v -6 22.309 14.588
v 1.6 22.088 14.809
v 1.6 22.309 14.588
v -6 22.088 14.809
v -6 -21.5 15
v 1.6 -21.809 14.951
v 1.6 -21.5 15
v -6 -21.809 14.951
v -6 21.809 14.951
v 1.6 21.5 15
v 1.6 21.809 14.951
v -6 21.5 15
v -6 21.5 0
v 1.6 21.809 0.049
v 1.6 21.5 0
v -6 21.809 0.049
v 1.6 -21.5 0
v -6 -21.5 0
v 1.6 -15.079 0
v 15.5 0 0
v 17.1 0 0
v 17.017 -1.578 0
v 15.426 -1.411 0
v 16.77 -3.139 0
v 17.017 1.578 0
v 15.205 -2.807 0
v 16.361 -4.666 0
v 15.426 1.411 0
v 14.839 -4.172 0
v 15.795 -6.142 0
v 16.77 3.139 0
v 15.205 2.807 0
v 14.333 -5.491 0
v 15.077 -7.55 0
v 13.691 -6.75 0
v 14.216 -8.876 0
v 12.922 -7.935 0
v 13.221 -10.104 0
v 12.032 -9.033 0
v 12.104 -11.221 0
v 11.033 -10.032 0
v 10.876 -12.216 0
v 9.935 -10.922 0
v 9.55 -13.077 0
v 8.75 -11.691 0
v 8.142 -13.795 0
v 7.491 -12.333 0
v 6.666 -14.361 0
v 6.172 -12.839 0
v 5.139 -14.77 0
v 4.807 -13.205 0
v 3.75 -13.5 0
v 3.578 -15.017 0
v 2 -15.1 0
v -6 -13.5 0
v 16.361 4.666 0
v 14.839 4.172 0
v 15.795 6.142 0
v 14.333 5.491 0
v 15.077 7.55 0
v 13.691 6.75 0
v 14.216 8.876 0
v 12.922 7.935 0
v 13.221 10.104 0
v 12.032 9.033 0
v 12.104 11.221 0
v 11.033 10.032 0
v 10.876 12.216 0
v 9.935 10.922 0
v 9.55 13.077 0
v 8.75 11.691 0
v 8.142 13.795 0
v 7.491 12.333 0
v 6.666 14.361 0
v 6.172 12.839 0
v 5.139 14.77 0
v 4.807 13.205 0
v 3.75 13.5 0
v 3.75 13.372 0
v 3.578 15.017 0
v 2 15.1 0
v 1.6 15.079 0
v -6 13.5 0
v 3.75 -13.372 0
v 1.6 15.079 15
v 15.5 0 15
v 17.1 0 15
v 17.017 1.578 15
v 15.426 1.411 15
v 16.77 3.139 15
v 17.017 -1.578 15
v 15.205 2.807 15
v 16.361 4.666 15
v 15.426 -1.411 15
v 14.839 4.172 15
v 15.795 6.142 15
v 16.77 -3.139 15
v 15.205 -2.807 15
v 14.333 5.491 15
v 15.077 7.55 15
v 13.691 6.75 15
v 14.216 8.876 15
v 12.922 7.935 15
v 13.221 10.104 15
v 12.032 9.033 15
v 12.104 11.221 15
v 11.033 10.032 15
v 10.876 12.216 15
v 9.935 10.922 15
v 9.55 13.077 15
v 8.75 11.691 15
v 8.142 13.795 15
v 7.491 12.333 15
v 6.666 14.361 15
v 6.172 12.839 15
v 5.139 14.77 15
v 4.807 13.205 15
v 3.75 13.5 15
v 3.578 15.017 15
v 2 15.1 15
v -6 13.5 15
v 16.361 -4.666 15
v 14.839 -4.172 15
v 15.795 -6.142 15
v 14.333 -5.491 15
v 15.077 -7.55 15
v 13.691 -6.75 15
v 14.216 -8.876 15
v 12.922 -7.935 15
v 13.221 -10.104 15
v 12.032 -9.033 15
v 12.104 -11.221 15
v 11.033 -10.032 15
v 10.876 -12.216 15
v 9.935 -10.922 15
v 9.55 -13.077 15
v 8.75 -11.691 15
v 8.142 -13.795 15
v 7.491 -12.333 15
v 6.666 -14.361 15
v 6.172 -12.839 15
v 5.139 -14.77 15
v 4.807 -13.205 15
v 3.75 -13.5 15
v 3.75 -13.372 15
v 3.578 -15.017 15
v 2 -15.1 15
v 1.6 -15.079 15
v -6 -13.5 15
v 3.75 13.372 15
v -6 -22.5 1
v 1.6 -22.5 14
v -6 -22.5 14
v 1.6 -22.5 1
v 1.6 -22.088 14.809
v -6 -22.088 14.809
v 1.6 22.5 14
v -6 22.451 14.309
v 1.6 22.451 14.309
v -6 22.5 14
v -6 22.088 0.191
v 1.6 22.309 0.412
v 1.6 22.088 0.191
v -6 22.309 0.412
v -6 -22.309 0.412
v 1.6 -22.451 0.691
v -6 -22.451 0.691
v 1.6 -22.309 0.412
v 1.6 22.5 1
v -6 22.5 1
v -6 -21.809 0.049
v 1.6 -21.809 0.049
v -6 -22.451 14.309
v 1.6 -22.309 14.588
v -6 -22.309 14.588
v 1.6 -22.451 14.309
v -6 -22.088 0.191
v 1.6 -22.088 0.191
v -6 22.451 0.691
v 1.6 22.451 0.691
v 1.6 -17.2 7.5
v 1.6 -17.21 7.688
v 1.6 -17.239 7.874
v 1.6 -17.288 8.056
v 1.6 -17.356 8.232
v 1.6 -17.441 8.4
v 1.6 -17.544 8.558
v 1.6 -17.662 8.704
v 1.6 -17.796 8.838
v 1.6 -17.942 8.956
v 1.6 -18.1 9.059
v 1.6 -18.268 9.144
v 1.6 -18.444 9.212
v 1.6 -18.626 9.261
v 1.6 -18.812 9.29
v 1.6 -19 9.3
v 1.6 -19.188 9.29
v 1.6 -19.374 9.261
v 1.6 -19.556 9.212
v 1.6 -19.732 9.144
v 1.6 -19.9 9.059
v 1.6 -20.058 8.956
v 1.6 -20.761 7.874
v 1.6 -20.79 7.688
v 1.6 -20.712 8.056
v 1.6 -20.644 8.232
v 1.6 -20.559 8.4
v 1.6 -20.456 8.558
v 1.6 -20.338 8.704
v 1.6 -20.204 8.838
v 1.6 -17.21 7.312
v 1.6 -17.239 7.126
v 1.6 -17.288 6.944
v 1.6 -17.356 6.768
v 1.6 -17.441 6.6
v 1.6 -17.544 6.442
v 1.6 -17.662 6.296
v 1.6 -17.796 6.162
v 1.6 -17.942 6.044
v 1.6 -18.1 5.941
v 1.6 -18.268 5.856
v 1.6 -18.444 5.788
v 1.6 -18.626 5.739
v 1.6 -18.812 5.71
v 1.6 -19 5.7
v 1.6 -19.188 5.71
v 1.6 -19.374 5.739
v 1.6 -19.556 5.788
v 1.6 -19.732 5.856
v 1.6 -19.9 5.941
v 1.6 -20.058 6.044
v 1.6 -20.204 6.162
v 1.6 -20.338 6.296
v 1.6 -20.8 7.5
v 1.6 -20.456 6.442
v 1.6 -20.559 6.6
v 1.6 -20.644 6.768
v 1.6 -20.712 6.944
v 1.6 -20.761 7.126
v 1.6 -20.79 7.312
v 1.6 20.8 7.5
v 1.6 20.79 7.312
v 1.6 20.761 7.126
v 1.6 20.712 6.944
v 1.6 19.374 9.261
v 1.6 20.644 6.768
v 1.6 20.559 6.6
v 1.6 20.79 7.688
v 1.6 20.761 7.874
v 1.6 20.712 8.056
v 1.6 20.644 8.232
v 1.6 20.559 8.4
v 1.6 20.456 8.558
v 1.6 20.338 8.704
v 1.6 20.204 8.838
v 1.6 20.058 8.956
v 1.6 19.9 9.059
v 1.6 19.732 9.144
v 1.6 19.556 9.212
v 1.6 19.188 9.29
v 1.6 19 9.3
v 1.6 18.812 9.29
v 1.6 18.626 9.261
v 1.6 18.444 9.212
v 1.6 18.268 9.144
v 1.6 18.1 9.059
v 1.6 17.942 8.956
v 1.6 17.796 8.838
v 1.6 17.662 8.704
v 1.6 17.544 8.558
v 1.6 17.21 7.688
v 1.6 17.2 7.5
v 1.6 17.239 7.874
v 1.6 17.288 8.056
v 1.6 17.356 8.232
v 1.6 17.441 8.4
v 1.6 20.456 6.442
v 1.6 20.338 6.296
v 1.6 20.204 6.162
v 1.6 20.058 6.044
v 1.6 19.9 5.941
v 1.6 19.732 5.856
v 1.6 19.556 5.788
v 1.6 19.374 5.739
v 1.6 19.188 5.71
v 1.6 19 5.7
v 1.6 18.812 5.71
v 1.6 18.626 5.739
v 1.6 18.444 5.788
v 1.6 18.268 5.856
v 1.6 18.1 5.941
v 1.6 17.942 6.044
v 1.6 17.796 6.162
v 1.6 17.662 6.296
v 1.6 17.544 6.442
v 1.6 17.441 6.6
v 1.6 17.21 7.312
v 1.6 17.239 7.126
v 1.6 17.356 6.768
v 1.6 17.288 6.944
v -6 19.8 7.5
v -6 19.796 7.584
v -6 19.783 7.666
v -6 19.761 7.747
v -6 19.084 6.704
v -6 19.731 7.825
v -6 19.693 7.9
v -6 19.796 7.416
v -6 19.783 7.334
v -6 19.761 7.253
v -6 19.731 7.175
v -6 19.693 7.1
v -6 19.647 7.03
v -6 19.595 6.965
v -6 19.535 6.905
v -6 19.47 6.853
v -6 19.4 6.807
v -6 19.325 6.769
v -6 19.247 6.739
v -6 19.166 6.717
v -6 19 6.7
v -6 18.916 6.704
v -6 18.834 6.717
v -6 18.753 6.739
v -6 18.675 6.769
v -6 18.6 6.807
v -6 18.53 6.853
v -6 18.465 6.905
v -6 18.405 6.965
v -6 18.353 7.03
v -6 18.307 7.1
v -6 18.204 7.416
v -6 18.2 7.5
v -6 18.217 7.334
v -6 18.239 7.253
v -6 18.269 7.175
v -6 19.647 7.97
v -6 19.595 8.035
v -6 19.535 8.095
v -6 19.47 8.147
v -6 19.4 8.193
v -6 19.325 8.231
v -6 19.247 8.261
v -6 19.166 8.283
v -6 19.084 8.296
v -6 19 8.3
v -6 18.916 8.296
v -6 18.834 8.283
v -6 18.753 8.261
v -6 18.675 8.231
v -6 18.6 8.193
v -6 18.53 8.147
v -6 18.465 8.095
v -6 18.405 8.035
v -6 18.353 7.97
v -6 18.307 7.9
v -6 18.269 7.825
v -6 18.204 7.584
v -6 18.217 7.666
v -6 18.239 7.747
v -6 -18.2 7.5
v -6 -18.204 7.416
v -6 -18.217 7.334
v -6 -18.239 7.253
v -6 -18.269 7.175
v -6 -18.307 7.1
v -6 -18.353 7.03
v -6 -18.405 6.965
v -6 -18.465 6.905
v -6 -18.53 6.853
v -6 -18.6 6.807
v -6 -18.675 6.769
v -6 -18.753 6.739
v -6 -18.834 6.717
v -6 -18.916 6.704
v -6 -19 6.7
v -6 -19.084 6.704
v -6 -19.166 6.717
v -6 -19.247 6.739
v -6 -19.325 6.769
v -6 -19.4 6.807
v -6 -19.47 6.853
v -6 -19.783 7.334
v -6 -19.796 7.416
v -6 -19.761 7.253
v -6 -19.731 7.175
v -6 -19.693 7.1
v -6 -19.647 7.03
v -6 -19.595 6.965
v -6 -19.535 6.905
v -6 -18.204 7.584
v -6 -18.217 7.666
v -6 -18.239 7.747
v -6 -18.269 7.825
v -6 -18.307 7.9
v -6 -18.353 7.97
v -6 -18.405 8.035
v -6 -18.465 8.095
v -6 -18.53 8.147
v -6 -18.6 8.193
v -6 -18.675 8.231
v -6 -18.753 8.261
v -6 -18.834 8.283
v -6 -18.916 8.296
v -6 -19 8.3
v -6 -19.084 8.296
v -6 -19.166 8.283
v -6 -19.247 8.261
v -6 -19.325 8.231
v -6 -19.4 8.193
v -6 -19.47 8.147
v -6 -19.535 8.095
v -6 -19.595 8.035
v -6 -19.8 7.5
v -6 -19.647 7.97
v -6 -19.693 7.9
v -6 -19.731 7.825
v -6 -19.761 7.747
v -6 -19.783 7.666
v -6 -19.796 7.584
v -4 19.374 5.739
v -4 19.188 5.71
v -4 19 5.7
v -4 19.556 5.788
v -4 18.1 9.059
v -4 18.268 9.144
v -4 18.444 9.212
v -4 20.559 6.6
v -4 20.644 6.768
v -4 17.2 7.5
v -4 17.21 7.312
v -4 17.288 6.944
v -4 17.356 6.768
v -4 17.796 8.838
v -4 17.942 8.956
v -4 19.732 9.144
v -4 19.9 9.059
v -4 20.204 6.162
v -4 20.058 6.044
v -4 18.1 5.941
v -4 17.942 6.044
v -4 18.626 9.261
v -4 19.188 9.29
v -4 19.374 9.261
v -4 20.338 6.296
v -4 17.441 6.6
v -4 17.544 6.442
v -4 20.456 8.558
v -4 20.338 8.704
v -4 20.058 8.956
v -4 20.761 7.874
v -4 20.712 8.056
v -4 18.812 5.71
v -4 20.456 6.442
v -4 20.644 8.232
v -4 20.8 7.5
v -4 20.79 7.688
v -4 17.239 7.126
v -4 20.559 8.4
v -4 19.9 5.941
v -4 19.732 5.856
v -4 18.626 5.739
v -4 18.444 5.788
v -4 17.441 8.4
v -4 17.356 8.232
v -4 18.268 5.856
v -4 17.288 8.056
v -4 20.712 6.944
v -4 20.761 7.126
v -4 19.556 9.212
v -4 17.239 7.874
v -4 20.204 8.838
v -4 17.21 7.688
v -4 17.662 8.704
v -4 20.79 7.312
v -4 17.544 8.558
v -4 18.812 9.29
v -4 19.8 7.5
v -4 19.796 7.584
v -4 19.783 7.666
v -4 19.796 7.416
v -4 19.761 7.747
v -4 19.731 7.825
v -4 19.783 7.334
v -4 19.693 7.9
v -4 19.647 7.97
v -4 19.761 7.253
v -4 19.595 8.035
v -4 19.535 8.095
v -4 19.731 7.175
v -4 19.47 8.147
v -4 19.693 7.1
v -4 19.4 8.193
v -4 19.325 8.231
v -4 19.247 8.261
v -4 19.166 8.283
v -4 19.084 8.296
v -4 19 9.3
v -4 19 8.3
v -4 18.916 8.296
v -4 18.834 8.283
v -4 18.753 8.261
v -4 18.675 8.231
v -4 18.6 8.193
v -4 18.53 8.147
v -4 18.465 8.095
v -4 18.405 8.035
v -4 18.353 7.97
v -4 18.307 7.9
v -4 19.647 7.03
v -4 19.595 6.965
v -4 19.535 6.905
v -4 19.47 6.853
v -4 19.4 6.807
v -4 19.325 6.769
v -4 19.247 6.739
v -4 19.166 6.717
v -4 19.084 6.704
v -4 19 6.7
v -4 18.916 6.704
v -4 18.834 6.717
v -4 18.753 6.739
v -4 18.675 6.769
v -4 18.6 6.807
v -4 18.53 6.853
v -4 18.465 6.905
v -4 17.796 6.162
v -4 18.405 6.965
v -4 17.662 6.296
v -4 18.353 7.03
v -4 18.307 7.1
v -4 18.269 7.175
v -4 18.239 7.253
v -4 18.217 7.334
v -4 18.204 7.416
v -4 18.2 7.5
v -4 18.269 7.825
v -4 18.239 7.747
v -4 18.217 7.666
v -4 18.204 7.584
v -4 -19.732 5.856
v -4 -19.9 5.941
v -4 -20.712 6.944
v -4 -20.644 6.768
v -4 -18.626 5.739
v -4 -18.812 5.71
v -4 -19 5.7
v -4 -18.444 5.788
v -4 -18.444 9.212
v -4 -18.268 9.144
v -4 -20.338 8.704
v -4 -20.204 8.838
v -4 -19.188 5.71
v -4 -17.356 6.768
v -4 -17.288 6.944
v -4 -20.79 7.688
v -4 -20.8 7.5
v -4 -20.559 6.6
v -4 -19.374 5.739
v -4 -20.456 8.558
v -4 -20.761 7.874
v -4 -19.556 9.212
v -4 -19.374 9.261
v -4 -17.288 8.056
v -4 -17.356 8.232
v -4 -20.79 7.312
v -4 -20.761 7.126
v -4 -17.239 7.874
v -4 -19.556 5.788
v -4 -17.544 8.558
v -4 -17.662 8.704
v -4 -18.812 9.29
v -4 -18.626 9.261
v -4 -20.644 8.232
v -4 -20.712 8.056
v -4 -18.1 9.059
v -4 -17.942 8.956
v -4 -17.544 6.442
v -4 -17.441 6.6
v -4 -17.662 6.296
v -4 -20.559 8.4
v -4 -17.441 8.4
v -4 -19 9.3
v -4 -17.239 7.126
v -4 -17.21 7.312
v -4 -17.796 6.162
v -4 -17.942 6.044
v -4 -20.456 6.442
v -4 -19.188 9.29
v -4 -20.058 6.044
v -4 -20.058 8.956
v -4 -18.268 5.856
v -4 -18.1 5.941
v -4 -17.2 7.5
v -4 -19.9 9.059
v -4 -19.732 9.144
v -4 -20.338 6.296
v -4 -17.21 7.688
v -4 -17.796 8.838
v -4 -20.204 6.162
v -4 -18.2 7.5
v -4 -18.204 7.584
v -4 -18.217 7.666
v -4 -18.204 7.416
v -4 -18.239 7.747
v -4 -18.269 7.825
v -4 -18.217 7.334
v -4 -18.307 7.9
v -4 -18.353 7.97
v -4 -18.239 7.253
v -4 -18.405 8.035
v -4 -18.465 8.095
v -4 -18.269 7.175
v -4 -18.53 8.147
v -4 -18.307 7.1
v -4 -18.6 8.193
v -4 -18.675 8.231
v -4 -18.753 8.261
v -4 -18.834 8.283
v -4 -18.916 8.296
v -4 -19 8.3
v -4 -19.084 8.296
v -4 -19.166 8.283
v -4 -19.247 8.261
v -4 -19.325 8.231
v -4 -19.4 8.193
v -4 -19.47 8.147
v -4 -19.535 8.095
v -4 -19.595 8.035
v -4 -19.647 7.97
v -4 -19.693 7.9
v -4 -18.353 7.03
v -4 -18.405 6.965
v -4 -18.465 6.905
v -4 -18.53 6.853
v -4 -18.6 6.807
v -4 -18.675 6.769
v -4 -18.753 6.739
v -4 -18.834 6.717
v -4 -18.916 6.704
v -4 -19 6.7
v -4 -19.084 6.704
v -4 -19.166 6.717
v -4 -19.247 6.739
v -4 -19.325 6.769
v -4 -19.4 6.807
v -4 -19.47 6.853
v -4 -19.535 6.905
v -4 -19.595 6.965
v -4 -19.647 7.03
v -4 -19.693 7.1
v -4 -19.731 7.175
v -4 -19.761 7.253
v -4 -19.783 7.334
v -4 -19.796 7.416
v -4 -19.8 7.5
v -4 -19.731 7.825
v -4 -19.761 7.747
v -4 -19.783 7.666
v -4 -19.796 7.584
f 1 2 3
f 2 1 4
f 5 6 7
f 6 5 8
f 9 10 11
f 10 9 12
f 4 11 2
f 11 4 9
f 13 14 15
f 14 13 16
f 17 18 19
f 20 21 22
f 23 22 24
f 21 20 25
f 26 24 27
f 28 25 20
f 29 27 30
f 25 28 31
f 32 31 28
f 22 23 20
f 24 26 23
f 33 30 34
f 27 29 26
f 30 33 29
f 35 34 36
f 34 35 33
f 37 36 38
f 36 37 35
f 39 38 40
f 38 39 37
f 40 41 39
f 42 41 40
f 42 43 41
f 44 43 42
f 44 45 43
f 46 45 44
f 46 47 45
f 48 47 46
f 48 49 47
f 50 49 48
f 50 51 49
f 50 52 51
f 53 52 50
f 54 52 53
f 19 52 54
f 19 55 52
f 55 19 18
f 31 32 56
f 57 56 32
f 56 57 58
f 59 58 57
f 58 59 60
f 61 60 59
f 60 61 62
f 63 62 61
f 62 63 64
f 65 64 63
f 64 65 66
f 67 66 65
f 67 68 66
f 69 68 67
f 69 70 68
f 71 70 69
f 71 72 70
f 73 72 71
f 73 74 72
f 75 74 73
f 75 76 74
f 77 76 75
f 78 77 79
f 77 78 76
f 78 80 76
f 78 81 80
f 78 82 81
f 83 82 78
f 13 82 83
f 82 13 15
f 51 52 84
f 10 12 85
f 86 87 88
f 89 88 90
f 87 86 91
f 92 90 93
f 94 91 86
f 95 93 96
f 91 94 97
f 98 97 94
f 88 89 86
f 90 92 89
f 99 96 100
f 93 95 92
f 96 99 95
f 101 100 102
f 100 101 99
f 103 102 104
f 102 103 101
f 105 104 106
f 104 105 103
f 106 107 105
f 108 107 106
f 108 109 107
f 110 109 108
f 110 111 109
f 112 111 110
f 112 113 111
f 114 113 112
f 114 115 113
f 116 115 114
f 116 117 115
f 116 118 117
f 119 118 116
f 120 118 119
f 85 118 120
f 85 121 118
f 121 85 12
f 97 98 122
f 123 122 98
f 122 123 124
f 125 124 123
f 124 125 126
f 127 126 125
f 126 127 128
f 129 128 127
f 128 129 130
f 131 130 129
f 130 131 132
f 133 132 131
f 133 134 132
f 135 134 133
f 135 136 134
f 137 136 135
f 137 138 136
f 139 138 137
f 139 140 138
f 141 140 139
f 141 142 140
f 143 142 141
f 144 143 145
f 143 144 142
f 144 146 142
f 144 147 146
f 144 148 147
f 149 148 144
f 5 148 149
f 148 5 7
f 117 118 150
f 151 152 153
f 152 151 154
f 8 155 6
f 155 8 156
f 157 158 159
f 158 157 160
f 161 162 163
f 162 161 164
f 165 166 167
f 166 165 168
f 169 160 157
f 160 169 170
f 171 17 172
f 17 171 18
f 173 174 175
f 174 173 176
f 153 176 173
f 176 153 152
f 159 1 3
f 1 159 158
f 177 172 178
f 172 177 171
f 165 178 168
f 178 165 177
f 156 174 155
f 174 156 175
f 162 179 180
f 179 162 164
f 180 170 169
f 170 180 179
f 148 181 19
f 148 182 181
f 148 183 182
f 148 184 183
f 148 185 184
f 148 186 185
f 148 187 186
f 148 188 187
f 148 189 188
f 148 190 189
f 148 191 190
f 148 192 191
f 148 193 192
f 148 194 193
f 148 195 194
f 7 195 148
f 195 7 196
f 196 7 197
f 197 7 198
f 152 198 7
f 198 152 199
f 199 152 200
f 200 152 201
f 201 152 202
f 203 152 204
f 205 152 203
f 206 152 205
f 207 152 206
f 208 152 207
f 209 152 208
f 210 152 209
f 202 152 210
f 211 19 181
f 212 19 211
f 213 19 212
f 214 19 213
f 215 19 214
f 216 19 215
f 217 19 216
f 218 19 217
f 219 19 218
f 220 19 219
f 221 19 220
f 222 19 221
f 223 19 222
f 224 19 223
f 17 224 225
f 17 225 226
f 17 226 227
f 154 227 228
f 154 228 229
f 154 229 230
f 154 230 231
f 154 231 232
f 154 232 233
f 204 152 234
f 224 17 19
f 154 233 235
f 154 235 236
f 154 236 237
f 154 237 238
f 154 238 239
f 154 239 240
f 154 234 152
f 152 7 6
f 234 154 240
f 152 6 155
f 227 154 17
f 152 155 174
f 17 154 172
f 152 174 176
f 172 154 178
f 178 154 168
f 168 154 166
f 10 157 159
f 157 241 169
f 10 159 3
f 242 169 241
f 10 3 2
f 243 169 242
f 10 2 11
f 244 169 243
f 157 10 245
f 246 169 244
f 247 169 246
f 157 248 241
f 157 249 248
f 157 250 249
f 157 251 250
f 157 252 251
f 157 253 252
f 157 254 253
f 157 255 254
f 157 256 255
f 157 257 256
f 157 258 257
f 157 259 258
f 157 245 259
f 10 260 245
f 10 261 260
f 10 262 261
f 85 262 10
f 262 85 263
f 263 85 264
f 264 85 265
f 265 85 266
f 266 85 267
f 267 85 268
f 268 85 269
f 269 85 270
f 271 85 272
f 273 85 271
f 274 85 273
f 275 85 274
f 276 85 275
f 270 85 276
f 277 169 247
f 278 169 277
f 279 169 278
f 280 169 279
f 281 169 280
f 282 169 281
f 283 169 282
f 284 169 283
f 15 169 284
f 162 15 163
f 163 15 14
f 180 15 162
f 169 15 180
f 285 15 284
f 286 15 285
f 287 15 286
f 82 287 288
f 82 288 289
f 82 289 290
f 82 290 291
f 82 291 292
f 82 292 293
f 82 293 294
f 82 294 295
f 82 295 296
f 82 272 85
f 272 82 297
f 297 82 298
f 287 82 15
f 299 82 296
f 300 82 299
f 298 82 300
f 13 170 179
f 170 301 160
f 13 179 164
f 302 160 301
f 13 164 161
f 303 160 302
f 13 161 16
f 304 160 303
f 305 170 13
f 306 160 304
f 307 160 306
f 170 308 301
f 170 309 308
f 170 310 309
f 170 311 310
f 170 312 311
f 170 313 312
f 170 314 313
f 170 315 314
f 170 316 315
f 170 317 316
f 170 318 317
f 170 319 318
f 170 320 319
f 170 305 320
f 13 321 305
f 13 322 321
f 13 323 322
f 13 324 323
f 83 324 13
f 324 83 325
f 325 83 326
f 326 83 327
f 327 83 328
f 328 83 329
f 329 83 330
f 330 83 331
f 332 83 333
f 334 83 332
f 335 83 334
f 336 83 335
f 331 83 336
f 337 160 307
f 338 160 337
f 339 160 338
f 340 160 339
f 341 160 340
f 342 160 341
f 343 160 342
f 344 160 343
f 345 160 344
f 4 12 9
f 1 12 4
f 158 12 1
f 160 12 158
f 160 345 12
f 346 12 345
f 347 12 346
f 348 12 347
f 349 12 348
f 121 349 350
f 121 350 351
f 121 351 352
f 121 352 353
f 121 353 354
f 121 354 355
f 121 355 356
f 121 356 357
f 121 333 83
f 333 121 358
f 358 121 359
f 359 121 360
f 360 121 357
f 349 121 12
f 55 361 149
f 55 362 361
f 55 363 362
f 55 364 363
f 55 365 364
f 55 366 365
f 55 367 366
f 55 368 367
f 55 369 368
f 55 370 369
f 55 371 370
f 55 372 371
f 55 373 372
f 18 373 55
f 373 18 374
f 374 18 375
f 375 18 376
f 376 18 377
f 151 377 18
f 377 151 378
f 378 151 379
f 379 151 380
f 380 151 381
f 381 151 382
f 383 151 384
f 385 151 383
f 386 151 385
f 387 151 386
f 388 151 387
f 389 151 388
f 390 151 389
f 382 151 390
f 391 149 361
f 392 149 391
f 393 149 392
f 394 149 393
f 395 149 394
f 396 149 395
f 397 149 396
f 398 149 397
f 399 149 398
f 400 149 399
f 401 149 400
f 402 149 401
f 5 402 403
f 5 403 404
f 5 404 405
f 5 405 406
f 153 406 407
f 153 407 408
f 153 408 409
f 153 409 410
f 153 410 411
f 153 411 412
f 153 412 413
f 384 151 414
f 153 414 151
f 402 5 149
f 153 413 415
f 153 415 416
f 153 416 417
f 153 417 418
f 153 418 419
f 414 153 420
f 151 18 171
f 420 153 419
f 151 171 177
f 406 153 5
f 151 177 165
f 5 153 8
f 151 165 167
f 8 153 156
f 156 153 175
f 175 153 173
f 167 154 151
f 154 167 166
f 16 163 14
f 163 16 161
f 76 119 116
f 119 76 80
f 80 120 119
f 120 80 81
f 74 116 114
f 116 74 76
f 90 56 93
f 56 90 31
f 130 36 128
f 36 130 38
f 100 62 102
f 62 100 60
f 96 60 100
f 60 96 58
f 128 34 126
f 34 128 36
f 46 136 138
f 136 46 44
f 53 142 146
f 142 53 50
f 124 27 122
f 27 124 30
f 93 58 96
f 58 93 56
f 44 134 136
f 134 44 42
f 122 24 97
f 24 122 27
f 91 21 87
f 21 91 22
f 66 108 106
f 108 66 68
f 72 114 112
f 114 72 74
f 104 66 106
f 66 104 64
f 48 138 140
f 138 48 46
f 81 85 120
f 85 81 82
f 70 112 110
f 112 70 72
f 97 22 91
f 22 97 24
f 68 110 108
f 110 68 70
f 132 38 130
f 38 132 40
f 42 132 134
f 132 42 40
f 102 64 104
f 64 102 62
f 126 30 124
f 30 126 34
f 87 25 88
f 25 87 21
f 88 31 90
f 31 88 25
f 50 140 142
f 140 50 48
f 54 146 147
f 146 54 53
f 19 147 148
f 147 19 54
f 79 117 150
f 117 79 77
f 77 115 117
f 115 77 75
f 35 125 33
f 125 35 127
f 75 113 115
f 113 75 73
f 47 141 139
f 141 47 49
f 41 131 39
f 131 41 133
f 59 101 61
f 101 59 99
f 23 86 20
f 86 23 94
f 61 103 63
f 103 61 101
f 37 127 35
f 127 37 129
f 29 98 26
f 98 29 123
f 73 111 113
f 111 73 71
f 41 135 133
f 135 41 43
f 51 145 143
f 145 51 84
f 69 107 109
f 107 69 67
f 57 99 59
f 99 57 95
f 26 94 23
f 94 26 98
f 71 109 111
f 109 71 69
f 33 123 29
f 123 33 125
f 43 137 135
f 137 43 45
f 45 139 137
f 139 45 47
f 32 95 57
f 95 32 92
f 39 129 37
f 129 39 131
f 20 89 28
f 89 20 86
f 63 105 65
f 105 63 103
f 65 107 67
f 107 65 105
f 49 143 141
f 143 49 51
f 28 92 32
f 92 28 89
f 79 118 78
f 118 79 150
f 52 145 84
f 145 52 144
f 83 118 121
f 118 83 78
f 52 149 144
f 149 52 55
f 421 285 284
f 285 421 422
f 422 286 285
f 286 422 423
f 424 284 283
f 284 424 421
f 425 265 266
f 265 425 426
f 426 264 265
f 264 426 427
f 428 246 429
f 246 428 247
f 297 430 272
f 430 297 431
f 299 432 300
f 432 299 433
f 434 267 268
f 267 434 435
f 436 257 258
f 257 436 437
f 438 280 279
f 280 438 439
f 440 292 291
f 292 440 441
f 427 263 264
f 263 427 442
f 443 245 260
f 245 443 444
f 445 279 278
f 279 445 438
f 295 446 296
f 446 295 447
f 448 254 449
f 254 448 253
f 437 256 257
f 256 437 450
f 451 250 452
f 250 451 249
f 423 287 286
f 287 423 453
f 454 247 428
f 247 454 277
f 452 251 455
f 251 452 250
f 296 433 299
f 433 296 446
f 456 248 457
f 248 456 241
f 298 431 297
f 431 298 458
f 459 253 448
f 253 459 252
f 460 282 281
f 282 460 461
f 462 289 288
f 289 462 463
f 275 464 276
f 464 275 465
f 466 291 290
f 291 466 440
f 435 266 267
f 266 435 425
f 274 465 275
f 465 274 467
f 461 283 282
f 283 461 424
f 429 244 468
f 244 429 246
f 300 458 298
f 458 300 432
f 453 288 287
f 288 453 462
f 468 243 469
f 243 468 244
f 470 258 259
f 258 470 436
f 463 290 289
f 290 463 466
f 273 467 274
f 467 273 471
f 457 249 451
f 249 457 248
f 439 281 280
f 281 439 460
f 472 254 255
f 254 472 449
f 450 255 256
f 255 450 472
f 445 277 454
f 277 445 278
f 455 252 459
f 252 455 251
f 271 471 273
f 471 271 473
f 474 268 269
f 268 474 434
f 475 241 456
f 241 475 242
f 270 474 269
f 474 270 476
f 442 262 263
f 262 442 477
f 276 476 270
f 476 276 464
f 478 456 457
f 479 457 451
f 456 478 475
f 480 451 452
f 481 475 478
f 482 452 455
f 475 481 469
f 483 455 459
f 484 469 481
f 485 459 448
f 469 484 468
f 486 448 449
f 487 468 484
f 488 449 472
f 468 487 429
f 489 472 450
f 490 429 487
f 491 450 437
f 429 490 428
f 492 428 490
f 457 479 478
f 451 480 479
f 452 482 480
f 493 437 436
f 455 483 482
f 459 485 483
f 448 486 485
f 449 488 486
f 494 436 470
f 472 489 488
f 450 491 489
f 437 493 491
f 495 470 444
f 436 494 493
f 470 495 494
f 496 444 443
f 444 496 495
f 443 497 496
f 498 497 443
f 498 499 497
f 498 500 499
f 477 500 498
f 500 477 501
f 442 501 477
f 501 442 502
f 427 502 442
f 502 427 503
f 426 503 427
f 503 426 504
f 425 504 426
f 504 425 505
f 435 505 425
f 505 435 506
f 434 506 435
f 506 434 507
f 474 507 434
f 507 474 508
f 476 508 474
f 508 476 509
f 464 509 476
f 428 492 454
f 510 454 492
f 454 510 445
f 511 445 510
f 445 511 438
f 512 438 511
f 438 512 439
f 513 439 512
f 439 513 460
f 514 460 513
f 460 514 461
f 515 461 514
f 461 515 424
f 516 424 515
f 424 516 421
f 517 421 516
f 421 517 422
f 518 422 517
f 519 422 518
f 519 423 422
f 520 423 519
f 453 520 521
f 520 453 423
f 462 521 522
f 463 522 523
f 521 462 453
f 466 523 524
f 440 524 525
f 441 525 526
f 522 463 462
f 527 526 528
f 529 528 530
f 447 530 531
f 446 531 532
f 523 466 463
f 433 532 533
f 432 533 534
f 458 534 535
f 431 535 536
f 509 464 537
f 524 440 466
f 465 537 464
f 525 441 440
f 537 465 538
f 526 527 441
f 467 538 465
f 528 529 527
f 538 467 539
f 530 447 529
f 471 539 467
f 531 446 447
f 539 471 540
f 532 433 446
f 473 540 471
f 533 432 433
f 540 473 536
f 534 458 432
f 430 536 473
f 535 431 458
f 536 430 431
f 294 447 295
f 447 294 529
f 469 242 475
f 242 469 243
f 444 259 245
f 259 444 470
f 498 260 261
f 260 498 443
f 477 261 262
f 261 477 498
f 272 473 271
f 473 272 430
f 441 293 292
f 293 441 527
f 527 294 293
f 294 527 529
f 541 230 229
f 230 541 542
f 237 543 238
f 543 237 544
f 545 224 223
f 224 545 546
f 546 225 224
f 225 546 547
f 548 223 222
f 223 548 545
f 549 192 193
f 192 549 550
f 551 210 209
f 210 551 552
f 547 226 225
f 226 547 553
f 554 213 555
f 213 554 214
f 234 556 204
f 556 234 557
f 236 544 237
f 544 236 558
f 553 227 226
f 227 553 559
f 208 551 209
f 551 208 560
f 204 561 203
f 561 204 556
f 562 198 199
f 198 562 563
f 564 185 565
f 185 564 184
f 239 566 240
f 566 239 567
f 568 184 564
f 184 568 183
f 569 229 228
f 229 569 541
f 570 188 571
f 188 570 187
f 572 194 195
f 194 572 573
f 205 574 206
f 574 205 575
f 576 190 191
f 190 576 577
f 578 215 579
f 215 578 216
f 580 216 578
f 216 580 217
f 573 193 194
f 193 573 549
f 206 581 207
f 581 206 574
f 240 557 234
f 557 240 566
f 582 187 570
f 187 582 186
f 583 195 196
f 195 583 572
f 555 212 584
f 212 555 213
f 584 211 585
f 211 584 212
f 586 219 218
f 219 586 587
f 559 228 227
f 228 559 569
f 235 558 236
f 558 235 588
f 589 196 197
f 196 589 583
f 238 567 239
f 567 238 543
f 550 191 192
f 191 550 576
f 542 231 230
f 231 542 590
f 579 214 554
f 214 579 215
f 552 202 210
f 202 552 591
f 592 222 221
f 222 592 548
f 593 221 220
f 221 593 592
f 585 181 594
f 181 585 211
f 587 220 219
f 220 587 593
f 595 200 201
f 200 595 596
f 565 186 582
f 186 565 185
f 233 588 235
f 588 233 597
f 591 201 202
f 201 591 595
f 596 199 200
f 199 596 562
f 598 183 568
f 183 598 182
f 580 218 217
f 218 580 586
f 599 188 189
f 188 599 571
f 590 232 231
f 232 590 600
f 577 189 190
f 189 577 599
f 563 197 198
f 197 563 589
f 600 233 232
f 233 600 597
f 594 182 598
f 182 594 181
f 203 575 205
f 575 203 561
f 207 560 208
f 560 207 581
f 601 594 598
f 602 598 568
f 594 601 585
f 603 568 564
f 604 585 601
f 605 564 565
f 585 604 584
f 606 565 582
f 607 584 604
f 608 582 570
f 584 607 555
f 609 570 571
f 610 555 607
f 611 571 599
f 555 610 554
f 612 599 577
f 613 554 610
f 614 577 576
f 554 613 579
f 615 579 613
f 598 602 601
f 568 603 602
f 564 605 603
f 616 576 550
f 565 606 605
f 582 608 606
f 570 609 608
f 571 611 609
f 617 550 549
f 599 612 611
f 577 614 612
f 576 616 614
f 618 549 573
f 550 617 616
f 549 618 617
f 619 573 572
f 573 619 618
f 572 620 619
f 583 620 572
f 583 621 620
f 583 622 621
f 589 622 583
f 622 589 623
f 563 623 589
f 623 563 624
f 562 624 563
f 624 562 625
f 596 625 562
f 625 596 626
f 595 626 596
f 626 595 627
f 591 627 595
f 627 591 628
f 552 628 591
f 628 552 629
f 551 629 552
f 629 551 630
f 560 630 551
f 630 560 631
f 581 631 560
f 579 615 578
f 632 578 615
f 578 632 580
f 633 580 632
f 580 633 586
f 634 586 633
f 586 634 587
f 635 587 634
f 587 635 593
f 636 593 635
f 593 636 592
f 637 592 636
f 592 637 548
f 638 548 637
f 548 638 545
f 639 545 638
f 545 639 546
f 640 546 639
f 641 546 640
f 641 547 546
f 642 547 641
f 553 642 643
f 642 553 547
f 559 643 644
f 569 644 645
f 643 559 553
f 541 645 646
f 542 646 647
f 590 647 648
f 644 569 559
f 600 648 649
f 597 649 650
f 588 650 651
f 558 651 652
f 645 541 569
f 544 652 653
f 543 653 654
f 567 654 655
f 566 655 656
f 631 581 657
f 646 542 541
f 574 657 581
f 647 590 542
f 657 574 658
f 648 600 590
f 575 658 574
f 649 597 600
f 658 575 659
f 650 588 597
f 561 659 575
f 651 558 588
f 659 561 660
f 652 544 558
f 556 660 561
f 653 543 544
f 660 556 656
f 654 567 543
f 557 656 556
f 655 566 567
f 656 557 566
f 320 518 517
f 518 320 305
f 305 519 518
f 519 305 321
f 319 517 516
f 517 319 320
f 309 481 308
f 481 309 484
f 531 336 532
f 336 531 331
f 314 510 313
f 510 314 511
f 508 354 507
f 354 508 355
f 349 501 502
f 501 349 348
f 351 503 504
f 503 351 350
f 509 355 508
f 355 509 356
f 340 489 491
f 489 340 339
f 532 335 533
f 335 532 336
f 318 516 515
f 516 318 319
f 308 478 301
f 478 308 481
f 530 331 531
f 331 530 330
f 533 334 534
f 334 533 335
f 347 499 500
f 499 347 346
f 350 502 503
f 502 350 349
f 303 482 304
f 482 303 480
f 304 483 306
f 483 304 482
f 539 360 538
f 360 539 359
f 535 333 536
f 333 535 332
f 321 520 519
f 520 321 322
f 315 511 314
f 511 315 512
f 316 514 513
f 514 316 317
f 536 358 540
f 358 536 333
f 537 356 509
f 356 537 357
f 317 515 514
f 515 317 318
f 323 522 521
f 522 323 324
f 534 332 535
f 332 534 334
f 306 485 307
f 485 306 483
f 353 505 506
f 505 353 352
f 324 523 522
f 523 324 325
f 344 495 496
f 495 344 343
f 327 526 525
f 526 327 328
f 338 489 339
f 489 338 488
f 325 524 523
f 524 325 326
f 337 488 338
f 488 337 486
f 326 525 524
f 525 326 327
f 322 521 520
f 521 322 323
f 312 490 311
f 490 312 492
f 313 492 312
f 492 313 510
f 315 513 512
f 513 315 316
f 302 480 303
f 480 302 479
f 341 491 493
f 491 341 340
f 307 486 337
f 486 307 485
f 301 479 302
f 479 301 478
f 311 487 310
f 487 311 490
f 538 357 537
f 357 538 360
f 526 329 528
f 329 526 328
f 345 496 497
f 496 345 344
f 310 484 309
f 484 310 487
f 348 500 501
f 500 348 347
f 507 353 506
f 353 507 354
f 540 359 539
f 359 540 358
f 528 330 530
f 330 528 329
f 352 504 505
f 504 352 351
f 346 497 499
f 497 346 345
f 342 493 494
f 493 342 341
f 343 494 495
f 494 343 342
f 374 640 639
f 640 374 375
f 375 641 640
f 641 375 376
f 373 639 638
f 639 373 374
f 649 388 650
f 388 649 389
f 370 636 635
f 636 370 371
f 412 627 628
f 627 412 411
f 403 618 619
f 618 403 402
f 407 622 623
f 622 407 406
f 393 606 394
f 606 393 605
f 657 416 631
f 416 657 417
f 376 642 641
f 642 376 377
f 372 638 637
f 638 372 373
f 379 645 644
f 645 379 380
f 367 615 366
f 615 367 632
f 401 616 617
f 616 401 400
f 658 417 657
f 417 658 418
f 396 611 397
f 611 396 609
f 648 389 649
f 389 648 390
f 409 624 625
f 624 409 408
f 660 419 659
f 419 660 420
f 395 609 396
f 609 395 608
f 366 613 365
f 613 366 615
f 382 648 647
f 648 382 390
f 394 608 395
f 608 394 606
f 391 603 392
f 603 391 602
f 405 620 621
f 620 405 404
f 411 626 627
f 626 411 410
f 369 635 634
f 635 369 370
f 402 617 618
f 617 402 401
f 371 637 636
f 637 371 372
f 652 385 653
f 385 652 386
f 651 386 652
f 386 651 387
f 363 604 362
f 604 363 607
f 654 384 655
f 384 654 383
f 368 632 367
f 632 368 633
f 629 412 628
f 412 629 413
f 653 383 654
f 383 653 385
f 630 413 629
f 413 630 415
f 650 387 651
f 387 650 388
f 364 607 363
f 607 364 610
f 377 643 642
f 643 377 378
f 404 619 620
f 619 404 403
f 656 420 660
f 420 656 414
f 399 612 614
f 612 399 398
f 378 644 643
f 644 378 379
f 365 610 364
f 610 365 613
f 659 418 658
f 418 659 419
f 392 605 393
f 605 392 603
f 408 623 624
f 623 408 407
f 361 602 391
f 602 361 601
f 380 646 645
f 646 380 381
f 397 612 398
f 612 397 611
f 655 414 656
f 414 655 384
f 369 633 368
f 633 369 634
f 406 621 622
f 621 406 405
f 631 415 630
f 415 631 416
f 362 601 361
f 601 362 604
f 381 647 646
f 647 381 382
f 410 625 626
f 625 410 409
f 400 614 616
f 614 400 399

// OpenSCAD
h = 15; // height
w = 45; // flange width
fd = 6; // flange depth
d = 1.6; // thickness
r1 = 27 / 2; // outer radius
r2 = 1.8; // screw hole head radius
r3 = 0.8; // screw hole radius
d2 = 4; // screw hole head depth
o = 3.5; // screw hole offset (from outer edges)

b = 2; //vertical bump

$fn = 60;


translate([0, 0, h/2]) rotate([0, 90, 0]) difference() {
    union() {
        hull() standoffs(1, d, h, w);
        translate([0, 0, b]) rotate([90, 0, 90]) cylinder(h, r1+d, r1+d, center=true);
    }
    union() {
        translate([0, 0, b]) rotate([90, 0, 90]) cylinder(h, r1, r1, center=true);  
        translate([0, 0, -h]) cube([h, r1*2, h*2 + h/2], center=true);
        translate([0, w/2 - o, -d2]) cylinder(d + d2, r2, r2);
        translate([0, -w/2 + o, -d2]) cylinder(d + d2, r2, r2);
        translate([0, w/2 - o, -fd]) cylinder(fd + d, r3, r3);
        translate([0, -w/2 + o, -fd]) cylinder(fd + d, r3, r3);
    }
}


module standoffs(r, depth, height, width) {
    $fn = 20;
    d = depth + fd;
    x = height / 2 - r;
    y = width / 2 - r;
    
    translate([0,0,-fd]) union() { 
        translate([x, y]) cylinder(d, r, r);
        translate([x, -y]) cylinder(d, r, r);
        translate([-x, y]) cylinder(d, r, r);
        translate([-x, -y]) cylinder(d, r, r);
    }
}
